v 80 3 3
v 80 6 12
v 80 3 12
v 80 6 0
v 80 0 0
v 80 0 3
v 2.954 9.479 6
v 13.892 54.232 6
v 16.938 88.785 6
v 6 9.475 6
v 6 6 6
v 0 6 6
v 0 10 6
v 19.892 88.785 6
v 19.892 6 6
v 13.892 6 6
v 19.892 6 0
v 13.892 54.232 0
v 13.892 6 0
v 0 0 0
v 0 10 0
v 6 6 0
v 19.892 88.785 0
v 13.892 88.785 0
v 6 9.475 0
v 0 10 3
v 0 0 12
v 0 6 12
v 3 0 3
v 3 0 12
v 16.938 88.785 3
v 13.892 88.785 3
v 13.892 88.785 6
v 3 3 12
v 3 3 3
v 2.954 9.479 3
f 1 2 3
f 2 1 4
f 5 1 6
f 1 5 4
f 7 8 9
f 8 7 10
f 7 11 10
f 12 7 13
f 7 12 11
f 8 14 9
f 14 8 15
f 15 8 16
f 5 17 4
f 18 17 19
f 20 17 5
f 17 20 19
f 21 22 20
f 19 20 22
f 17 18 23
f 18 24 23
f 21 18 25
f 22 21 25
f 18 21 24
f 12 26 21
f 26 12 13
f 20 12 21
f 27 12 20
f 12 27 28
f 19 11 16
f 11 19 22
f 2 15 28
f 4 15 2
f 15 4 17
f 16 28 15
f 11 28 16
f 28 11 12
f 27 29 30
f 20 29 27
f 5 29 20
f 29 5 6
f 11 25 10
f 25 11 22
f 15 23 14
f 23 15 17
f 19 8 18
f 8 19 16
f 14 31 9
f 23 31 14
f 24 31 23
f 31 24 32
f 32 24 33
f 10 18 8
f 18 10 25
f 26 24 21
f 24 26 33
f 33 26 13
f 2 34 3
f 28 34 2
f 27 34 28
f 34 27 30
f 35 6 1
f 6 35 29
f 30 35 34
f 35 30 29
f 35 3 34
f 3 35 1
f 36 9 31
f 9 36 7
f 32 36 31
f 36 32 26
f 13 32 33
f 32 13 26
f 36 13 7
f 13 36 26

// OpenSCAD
// file: pistation.scad
/*--------------------------------------------------------------------------*
* Defines all the sizes we need. This file is used by all other SCADs
*--------------------------------------------------------------------------*/

// Define the dimensions of the things we need to place
LCD_OUTER_WIDTH  = 105;
LCD_OUTER_HEIGHT = 68;
LCD_OUTER_DEPTH  = 3;

LCD_INNER_WIDTH  = 98;
LCD_INNER_HEIGHT = 57;
LCD_INNER_DEPTH  = 1;

LCD_UPPER_SPACE = 3;
LCD_LOWER_SPACE = 8;
LCD_LEFT_SPACE  = 3.5;
LCD_RIGHT_SPACE = 3.5;

BUTTON_DIAMETER = 10;
BUTTON_DEPTH    = 7;
BUTTON_SPACE    = 3;

GENERAL_SPACE   = 6;

FRAME_WIDTH = 80;
FRAME_STEP  = 10;

FRONT_ANGLE = 10;

MDF_SIZE = 3;

// Now calculate the extra sizes
BLOCK_WIDTH  = GENERAL_SPACE + LCD_OUTER_WIDTH + GENERAL_SPACE + BUTTON_DIAMETER + GENERAL_SPACE;
BLOCK_HEIGHT = GENERAL_SPACE + LCD_OUTER_HEIGHT + GENERAL_SPACE;
BLOCK_DEPTH  = LCD_OUTER_DEPTH + LCD_INNER_DEPTH;

TOTAL_BUTTON_HEIGHT = 4 * (BUTTON_DIAMETER + BUTTON_SPACE);
TOTAL_BUTTON_WIDTH  = BUTTON_DIAMETER;

PANEL_SIDE_WIDTH  = BLOCK_HEIGHT * sin(FRONT_ANGLE);
PANEL_SIDE_HEIGHT = BLOCK_HEIGHT * cos(FRONT_ANGLE);

FRAME_HEIGHT = FRAME_STEP + PANEL_SIDE_HEIGHT;

/** Create a frame
 *
 * This creates the left frame (without any cutouts). It is used as the basis
 * for the left and right frame SCAD files.
 */
module frame() {
  // Let's make the frame components
  cube(size = [ FRAME_WIDTH, GENERAL_SPACE, GENERAL_SPACE ], center = false);
  cube(size = [ GENERAL_SPACE, FRAME_STEP, GENERAL_SPACE ], center = false);
  translate(v = [ PANEL_SIDE_WIDTH, 0, 0 ]) {
    cube(size = [ GENERAL_SPACE, FRAME_HEIGHT, GENERAL_SPACE ], center = false);
    }
  translate(v = [ 0, FRAME_STEP, 0 ]) {
    rotate(a = [ 0, 0, -FRONT_ANGLE ]) {
      cube(size = [ GENERAL_SPACE, BLOCK_HEIGHT, GENERAL_SPACE ], center = false);
      }
    }
  }
// main file
/*--------------------------------------------------------------------------*
* Describes the left hand side frame for the PiStation.
*--------------------------------------------------------------------------*/
include <pistation.scad>

// Create a frame and add cutouts for mounting
difference() {
  union() {
    frame();
    cube(size = [ FRAME_WIDTH, GENERAL_SPACE, GENERAL_SPACE * 2], center = false);
    }
  translate(v = [ MDF_SIZE, 0, GENERAL_SPACE - MDF_SIZE ]) {
    cube(size = [ FRAME_WIDTH, MDF_SIZE, 3 * GENERAL_SPACE ], center = false);
    }
  translate(v = [ 0, FRAME_STEP, GENERAL_SPACE - MDF_SIZE ]) {
    rotate(a = [ 0, 0, -FRONT_ANGLE ]) {
      cube(size = [ MDF_SIZE, BLOCK_HEIGHT + GENERAL_SPACE, GENERAL_SPACE ], center = false);
      }
    }
  }  

//cube(size = [ FRAME_WIDTH, FRAME_HEIGHT, GENERAL_SPACE ], center = false);
